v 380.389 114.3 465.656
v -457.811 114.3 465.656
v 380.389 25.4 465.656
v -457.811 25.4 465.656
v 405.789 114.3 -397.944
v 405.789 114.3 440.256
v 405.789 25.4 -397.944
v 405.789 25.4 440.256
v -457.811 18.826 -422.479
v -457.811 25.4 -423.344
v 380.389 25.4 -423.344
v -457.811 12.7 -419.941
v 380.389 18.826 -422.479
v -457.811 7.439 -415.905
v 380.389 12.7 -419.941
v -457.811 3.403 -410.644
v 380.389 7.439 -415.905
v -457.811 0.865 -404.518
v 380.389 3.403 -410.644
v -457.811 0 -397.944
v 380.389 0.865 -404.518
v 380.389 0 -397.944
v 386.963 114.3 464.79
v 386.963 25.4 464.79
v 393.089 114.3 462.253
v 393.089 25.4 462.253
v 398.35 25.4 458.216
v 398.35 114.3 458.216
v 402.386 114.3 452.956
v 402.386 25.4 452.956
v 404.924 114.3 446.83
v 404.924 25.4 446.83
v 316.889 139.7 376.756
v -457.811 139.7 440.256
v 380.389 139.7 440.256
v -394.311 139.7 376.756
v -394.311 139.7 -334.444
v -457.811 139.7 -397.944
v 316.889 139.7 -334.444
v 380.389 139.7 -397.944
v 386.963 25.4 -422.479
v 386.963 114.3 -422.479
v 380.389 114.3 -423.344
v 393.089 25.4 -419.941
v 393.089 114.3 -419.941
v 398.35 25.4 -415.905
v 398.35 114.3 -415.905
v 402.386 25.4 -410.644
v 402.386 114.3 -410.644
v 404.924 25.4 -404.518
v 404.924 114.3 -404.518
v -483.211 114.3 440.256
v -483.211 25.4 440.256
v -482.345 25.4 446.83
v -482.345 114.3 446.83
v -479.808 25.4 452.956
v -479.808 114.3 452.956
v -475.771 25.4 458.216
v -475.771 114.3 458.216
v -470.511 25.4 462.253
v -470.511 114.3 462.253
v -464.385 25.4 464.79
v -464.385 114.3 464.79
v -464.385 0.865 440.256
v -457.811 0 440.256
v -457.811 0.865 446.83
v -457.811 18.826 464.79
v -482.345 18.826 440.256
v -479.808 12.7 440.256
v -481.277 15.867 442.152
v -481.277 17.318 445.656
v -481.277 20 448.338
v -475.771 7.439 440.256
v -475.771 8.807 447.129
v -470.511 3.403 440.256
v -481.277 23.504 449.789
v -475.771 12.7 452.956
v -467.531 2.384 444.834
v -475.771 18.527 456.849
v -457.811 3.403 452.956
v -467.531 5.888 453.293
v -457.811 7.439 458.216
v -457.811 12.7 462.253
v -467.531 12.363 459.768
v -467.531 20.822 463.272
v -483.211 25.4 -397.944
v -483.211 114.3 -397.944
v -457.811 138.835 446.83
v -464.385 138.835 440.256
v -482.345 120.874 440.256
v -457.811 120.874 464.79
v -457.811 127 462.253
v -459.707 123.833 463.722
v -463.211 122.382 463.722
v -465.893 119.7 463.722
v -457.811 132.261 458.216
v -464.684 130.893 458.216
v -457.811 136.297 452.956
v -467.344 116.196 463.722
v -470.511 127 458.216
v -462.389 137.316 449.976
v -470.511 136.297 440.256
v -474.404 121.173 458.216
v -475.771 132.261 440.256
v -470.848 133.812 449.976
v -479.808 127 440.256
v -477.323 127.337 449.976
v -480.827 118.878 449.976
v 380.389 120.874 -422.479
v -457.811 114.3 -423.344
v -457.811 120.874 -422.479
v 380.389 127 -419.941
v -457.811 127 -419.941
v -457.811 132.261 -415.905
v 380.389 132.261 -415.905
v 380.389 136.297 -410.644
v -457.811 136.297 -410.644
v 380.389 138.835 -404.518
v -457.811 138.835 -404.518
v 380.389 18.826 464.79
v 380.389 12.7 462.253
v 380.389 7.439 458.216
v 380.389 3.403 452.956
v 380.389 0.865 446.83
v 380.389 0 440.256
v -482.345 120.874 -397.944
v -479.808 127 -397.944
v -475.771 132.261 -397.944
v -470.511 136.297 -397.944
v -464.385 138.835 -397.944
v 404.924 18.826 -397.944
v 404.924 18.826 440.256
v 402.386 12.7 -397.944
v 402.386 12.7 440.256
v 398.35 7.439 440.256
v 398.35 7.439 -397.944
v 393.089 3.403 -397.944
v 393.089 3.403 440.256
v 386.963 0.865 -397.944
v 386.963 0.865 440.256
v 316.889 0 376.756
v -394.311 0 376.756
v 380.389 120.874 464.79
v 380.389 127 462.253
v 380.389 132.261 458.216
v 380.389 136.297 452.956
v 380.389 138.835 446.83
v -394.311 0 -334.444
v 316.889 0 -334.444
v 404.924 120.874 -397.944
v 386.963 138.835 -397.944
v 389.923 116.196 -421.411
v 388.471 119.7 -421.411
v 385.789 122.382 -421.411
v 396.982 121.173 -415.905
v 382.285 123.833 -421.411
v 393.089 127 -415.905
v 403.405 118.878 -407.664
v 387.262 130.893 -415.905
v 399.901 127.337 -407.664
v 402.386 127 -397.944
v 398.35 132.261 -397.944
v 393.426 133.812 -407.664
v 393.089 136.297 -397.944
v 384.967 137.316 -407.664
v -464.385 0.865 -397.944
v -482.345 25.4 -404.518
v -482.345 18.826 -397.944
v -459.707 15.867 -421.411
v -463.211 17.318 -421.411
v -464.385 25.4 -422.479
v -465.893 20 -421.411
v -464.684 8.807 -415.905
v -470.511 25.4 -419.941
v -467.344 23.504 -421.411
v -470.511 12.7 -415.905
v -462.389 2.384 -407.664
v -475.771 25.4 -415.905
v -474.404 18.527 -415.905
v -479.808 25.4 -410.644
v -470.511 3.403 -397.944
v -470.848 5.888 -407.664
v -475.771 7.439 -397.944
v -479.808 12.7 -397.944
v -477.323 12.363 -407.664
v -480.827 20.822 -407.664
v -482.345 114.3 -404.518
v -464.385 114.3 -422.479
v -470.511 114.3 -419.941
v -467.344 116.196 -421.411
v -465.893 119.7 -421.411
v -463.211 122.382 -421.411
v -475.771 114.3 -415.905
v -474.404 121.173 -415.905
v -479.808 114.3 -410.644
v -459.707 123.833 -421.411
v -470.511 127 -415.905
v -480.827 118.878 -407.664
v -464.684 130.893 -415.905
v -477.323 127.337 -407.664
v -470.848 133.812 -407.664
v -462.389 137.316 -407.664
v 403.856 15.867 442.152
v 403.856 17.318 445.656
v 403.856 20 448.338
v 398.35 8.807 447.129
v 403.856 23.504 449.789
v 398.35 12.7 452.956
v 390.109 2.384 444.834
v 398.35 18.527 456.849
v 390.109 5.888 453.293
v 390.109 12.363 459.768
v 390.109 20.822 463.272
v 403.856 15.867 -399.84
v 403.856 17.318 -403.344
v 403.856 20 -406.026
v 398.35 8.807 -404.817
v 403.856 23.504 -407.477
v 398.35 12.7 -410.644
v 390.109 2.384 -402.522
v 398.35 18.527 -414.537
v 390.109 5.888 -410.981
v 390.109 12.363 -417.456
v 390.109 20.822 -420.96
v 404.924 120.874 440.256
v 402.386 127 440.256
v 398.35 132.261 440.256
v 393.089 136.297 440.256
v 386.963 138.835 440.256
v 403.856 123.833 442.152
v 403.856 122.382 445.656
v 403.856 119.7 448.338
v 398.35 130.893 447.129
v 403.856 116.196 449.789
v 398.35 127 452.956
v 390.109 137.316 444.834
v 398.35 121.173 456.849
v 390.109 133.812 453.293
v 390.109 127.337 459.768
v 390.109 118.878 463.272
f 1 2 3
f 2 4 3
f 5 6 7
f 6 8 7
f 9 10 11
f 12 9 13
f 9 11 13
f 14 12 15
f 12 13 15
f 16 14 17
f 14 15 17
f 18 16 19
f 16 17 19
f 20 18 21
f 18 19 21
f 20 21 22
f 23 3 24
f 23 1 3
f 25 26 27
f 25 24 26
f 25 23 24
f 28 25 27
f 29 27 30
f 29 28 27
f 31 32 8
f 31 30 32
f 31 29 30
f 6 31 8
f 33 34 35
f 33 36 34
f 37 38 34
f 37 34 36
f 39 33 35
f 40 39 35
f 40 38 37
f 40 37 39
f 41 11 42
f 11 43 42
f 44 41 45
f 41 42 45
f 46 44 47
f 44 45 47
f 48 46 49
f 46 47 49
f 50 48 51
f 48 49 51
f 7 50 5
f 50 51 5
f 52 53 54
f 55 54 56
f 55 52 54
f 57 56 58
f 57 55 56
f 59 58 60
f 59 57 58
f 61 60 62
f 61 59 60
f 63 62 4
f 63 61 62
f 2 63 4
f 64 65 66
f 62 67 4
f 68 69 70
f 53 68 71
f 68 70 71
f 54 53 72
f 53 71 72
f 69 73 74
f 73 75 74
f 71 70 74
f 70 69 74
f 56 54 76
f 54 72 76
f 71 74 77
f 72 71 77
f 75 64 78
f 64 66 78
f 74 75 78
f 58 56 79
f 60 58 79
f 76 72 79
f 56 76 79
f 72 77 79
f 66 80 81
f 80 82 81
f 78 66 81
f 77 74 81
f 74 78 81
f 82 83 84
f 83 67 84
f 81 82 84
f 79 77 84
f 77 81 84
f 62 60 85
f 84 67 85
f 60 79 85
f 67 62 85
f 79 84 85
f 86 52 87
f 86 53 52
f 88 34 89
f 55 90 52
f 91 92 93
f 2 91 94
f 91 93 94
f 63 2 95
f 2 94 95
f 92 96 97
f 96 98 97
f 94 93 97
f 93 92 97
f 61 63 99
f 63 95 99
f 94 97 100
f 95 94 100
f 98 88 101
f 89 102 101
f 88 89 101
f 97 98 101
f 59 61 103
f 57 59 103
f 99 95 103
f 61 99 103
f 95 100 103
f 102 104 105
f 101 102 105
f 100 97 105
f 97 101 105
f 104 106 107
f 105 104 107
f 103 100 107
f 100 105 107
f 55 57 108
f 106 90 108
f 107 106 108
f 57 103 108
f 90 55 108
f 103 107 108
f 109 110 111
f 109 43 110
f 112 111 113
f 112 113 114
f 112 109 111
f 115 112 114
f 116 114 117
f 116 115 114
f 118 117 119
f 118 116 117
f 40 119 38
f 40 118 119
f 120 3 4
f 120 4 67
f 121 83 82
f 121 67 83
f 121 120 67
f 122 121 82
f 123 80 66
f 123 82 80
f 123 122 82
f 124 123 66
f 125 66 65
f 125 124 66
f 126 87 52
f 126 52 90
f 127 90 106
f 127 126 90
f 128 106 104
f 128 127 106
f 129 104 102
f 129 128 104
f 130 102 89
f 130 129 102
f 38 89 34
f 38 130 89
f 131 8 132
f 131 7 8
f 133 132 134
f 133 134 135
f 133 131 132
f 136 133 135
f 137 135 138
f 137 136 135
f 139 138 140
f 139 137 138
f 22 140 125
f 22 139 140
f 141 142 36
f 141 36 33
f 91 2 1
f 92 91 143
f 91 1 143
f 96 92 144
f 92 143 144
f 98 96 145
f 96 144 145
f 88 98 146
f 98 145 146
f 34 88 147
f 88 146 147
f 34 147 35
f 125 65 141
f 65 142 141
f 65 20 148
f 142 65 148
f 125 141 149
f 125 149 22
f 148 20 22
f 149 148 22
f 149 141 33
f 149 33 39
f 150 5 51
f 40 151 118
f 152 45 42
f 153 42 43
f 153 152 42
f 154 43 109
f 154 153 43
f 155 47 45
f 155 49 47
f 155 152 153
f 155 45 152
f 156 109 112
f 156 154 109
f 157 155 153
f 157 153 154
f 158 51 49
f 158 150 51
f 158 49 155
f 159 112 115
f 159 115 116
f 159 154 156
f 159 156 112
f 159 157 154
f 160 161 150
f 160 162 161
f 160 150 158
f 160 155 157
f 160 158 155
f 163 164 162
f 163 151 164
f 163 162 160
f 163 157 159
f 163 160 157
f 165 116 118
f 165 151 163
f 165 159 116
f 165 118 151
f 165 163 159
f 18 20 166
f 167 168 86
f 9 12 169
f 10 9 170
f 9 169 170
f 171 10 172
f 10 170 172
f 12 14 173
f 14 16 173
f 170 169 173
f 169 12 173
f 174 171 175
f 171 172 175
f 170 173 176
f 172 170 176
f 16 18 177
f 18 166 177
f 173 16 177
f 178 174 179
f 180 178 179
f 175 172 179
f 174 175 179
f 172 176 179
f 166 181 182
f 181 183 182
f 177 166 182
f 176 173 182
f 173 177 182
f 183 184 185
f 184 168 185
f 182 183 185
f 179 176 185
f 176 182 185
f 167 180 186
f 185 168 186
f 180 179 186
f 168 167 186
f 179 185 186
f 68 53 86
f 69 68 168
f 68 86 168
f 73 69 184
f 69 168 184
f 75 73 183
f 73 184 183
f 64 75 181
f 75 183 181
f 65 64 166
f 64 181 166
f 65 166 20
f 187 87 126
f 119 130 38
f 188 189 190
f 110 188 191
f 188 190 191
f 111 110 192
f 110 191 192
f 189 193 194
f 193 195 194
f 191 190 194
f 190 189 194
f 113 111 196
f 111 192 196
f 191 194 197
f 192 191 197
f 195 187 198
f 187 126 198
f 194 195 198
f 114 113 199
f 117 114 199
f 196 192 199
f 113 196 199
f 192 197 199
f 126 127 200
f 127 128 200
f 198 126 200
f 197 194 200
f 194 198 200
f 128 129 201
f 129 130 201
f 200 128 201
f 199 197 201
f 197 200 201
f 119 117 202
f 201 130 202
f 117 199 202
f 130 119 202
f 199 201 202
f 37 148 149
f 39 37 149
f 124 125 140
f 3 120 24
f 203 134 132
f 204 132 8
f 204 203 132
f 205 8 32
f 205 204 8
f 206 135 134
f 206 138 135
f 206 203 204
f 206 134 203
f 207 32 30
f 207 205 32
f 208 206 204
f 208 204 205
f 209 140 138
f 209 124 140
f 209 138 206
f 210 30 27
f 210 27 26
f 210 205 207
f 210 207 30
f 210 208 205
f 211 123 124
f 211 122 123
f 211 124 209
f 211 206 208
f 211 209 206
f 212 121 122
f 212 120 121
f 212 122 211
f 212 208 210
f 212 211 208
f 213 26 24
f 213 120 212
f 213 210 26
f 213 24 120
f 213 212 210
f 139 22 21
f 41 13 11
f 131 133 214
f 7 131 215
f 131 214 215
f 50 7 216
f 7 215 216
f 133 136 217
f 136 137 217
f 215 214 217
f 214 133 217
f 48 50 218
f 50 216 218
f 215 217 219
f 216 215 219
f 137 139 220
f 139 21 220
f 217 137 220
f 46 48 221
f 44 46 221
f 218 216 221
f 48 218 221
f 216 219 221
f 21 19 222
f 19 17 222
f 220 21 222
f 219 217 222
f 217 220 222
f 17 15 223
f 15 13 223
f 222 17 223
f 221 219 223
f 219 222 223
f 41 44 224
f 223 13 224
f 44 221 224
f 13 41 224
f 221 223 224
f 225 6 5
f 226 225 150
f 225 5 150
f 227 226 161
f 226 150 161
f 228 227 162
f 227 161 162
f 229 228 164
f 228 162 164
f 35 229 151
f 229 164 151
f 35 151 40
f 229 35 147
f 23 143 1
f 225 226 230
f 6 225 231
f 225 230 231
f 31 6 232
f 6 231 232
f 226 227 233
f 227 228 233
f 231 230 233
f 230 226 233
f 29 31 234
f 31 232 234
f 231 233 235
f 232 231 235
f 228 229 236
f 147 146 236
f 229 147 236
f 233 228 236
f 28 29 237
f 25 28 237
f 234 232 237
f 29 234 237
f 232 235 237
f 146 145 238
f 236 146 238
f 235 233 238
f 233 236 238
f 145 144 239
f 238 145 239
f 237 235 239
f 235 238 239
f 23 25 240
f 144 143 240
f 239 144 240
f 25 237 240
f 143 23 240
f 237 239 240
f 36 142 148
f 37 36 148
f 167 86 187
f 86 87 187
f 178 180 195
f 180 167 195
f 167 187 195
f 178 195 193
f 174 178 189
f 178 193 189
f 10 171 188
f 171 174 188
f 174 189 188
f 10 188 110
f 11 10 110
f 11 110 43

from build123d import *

# Parameters (mm, degrees)
SKETCH1_W           = 889
SKETCH1_H           = 889
SKETCH1_W_2         = 711.2
SKETCH1_H_2         = 711.2
BOSS_EXTRUDE1_DEPTH = 139.7
FILLET2_R           = 25.4


with BuildPart() as part:
    # Sketch1 → Boss-Extrude1 (new body)
    with BuildSketch(Plane(origin=(0, 0, 0), x_dir=(1, 0, 0), z_dir=(0, 1, 0))):
        with Locations((-38.710886076, -21.155949367)):
            Rectangle(SKETCH1_W, SKETCH1_H)
        with Locations((-38.710886076, -21.155949367)):
            Rectangle(SKETCH1_W_2, SKETCH1_H_2, mode=Mode.SUBTRACT)
    extrude(amount=BOSS_EXTRUDE1_DEPTH)

    # Fillet2
    fillet2_edges = [part.edges().sort_by_distance(p)[0] for p in [
        (-483.210886076, 139.7, 21.155949367),
        (-38.710886076, 139.7, 465.655949367),
        (405.789113924, 139.7, 21.155949367),
        (-38.710886076, 0, 465.655949367),
        (-483.210886076, 0, 21.155949367),
        (-38.710886076, 0, -423.344050633),
        (405.789113924, 0, 21.155949367),
        (405.789113924, 69.85, 465.655949367),
        (-483.210886076, 69.85, 465.655949367),
        (-483.210886076, 69.85, -423.344050633),
        (405.789113924, 69.85, -423.344050633),
        (-38.710886076, 139.7, -423.344050633),
    ]]
    fillet(fillet2_edges, radius=FILLET2_R)


solid = part.part
